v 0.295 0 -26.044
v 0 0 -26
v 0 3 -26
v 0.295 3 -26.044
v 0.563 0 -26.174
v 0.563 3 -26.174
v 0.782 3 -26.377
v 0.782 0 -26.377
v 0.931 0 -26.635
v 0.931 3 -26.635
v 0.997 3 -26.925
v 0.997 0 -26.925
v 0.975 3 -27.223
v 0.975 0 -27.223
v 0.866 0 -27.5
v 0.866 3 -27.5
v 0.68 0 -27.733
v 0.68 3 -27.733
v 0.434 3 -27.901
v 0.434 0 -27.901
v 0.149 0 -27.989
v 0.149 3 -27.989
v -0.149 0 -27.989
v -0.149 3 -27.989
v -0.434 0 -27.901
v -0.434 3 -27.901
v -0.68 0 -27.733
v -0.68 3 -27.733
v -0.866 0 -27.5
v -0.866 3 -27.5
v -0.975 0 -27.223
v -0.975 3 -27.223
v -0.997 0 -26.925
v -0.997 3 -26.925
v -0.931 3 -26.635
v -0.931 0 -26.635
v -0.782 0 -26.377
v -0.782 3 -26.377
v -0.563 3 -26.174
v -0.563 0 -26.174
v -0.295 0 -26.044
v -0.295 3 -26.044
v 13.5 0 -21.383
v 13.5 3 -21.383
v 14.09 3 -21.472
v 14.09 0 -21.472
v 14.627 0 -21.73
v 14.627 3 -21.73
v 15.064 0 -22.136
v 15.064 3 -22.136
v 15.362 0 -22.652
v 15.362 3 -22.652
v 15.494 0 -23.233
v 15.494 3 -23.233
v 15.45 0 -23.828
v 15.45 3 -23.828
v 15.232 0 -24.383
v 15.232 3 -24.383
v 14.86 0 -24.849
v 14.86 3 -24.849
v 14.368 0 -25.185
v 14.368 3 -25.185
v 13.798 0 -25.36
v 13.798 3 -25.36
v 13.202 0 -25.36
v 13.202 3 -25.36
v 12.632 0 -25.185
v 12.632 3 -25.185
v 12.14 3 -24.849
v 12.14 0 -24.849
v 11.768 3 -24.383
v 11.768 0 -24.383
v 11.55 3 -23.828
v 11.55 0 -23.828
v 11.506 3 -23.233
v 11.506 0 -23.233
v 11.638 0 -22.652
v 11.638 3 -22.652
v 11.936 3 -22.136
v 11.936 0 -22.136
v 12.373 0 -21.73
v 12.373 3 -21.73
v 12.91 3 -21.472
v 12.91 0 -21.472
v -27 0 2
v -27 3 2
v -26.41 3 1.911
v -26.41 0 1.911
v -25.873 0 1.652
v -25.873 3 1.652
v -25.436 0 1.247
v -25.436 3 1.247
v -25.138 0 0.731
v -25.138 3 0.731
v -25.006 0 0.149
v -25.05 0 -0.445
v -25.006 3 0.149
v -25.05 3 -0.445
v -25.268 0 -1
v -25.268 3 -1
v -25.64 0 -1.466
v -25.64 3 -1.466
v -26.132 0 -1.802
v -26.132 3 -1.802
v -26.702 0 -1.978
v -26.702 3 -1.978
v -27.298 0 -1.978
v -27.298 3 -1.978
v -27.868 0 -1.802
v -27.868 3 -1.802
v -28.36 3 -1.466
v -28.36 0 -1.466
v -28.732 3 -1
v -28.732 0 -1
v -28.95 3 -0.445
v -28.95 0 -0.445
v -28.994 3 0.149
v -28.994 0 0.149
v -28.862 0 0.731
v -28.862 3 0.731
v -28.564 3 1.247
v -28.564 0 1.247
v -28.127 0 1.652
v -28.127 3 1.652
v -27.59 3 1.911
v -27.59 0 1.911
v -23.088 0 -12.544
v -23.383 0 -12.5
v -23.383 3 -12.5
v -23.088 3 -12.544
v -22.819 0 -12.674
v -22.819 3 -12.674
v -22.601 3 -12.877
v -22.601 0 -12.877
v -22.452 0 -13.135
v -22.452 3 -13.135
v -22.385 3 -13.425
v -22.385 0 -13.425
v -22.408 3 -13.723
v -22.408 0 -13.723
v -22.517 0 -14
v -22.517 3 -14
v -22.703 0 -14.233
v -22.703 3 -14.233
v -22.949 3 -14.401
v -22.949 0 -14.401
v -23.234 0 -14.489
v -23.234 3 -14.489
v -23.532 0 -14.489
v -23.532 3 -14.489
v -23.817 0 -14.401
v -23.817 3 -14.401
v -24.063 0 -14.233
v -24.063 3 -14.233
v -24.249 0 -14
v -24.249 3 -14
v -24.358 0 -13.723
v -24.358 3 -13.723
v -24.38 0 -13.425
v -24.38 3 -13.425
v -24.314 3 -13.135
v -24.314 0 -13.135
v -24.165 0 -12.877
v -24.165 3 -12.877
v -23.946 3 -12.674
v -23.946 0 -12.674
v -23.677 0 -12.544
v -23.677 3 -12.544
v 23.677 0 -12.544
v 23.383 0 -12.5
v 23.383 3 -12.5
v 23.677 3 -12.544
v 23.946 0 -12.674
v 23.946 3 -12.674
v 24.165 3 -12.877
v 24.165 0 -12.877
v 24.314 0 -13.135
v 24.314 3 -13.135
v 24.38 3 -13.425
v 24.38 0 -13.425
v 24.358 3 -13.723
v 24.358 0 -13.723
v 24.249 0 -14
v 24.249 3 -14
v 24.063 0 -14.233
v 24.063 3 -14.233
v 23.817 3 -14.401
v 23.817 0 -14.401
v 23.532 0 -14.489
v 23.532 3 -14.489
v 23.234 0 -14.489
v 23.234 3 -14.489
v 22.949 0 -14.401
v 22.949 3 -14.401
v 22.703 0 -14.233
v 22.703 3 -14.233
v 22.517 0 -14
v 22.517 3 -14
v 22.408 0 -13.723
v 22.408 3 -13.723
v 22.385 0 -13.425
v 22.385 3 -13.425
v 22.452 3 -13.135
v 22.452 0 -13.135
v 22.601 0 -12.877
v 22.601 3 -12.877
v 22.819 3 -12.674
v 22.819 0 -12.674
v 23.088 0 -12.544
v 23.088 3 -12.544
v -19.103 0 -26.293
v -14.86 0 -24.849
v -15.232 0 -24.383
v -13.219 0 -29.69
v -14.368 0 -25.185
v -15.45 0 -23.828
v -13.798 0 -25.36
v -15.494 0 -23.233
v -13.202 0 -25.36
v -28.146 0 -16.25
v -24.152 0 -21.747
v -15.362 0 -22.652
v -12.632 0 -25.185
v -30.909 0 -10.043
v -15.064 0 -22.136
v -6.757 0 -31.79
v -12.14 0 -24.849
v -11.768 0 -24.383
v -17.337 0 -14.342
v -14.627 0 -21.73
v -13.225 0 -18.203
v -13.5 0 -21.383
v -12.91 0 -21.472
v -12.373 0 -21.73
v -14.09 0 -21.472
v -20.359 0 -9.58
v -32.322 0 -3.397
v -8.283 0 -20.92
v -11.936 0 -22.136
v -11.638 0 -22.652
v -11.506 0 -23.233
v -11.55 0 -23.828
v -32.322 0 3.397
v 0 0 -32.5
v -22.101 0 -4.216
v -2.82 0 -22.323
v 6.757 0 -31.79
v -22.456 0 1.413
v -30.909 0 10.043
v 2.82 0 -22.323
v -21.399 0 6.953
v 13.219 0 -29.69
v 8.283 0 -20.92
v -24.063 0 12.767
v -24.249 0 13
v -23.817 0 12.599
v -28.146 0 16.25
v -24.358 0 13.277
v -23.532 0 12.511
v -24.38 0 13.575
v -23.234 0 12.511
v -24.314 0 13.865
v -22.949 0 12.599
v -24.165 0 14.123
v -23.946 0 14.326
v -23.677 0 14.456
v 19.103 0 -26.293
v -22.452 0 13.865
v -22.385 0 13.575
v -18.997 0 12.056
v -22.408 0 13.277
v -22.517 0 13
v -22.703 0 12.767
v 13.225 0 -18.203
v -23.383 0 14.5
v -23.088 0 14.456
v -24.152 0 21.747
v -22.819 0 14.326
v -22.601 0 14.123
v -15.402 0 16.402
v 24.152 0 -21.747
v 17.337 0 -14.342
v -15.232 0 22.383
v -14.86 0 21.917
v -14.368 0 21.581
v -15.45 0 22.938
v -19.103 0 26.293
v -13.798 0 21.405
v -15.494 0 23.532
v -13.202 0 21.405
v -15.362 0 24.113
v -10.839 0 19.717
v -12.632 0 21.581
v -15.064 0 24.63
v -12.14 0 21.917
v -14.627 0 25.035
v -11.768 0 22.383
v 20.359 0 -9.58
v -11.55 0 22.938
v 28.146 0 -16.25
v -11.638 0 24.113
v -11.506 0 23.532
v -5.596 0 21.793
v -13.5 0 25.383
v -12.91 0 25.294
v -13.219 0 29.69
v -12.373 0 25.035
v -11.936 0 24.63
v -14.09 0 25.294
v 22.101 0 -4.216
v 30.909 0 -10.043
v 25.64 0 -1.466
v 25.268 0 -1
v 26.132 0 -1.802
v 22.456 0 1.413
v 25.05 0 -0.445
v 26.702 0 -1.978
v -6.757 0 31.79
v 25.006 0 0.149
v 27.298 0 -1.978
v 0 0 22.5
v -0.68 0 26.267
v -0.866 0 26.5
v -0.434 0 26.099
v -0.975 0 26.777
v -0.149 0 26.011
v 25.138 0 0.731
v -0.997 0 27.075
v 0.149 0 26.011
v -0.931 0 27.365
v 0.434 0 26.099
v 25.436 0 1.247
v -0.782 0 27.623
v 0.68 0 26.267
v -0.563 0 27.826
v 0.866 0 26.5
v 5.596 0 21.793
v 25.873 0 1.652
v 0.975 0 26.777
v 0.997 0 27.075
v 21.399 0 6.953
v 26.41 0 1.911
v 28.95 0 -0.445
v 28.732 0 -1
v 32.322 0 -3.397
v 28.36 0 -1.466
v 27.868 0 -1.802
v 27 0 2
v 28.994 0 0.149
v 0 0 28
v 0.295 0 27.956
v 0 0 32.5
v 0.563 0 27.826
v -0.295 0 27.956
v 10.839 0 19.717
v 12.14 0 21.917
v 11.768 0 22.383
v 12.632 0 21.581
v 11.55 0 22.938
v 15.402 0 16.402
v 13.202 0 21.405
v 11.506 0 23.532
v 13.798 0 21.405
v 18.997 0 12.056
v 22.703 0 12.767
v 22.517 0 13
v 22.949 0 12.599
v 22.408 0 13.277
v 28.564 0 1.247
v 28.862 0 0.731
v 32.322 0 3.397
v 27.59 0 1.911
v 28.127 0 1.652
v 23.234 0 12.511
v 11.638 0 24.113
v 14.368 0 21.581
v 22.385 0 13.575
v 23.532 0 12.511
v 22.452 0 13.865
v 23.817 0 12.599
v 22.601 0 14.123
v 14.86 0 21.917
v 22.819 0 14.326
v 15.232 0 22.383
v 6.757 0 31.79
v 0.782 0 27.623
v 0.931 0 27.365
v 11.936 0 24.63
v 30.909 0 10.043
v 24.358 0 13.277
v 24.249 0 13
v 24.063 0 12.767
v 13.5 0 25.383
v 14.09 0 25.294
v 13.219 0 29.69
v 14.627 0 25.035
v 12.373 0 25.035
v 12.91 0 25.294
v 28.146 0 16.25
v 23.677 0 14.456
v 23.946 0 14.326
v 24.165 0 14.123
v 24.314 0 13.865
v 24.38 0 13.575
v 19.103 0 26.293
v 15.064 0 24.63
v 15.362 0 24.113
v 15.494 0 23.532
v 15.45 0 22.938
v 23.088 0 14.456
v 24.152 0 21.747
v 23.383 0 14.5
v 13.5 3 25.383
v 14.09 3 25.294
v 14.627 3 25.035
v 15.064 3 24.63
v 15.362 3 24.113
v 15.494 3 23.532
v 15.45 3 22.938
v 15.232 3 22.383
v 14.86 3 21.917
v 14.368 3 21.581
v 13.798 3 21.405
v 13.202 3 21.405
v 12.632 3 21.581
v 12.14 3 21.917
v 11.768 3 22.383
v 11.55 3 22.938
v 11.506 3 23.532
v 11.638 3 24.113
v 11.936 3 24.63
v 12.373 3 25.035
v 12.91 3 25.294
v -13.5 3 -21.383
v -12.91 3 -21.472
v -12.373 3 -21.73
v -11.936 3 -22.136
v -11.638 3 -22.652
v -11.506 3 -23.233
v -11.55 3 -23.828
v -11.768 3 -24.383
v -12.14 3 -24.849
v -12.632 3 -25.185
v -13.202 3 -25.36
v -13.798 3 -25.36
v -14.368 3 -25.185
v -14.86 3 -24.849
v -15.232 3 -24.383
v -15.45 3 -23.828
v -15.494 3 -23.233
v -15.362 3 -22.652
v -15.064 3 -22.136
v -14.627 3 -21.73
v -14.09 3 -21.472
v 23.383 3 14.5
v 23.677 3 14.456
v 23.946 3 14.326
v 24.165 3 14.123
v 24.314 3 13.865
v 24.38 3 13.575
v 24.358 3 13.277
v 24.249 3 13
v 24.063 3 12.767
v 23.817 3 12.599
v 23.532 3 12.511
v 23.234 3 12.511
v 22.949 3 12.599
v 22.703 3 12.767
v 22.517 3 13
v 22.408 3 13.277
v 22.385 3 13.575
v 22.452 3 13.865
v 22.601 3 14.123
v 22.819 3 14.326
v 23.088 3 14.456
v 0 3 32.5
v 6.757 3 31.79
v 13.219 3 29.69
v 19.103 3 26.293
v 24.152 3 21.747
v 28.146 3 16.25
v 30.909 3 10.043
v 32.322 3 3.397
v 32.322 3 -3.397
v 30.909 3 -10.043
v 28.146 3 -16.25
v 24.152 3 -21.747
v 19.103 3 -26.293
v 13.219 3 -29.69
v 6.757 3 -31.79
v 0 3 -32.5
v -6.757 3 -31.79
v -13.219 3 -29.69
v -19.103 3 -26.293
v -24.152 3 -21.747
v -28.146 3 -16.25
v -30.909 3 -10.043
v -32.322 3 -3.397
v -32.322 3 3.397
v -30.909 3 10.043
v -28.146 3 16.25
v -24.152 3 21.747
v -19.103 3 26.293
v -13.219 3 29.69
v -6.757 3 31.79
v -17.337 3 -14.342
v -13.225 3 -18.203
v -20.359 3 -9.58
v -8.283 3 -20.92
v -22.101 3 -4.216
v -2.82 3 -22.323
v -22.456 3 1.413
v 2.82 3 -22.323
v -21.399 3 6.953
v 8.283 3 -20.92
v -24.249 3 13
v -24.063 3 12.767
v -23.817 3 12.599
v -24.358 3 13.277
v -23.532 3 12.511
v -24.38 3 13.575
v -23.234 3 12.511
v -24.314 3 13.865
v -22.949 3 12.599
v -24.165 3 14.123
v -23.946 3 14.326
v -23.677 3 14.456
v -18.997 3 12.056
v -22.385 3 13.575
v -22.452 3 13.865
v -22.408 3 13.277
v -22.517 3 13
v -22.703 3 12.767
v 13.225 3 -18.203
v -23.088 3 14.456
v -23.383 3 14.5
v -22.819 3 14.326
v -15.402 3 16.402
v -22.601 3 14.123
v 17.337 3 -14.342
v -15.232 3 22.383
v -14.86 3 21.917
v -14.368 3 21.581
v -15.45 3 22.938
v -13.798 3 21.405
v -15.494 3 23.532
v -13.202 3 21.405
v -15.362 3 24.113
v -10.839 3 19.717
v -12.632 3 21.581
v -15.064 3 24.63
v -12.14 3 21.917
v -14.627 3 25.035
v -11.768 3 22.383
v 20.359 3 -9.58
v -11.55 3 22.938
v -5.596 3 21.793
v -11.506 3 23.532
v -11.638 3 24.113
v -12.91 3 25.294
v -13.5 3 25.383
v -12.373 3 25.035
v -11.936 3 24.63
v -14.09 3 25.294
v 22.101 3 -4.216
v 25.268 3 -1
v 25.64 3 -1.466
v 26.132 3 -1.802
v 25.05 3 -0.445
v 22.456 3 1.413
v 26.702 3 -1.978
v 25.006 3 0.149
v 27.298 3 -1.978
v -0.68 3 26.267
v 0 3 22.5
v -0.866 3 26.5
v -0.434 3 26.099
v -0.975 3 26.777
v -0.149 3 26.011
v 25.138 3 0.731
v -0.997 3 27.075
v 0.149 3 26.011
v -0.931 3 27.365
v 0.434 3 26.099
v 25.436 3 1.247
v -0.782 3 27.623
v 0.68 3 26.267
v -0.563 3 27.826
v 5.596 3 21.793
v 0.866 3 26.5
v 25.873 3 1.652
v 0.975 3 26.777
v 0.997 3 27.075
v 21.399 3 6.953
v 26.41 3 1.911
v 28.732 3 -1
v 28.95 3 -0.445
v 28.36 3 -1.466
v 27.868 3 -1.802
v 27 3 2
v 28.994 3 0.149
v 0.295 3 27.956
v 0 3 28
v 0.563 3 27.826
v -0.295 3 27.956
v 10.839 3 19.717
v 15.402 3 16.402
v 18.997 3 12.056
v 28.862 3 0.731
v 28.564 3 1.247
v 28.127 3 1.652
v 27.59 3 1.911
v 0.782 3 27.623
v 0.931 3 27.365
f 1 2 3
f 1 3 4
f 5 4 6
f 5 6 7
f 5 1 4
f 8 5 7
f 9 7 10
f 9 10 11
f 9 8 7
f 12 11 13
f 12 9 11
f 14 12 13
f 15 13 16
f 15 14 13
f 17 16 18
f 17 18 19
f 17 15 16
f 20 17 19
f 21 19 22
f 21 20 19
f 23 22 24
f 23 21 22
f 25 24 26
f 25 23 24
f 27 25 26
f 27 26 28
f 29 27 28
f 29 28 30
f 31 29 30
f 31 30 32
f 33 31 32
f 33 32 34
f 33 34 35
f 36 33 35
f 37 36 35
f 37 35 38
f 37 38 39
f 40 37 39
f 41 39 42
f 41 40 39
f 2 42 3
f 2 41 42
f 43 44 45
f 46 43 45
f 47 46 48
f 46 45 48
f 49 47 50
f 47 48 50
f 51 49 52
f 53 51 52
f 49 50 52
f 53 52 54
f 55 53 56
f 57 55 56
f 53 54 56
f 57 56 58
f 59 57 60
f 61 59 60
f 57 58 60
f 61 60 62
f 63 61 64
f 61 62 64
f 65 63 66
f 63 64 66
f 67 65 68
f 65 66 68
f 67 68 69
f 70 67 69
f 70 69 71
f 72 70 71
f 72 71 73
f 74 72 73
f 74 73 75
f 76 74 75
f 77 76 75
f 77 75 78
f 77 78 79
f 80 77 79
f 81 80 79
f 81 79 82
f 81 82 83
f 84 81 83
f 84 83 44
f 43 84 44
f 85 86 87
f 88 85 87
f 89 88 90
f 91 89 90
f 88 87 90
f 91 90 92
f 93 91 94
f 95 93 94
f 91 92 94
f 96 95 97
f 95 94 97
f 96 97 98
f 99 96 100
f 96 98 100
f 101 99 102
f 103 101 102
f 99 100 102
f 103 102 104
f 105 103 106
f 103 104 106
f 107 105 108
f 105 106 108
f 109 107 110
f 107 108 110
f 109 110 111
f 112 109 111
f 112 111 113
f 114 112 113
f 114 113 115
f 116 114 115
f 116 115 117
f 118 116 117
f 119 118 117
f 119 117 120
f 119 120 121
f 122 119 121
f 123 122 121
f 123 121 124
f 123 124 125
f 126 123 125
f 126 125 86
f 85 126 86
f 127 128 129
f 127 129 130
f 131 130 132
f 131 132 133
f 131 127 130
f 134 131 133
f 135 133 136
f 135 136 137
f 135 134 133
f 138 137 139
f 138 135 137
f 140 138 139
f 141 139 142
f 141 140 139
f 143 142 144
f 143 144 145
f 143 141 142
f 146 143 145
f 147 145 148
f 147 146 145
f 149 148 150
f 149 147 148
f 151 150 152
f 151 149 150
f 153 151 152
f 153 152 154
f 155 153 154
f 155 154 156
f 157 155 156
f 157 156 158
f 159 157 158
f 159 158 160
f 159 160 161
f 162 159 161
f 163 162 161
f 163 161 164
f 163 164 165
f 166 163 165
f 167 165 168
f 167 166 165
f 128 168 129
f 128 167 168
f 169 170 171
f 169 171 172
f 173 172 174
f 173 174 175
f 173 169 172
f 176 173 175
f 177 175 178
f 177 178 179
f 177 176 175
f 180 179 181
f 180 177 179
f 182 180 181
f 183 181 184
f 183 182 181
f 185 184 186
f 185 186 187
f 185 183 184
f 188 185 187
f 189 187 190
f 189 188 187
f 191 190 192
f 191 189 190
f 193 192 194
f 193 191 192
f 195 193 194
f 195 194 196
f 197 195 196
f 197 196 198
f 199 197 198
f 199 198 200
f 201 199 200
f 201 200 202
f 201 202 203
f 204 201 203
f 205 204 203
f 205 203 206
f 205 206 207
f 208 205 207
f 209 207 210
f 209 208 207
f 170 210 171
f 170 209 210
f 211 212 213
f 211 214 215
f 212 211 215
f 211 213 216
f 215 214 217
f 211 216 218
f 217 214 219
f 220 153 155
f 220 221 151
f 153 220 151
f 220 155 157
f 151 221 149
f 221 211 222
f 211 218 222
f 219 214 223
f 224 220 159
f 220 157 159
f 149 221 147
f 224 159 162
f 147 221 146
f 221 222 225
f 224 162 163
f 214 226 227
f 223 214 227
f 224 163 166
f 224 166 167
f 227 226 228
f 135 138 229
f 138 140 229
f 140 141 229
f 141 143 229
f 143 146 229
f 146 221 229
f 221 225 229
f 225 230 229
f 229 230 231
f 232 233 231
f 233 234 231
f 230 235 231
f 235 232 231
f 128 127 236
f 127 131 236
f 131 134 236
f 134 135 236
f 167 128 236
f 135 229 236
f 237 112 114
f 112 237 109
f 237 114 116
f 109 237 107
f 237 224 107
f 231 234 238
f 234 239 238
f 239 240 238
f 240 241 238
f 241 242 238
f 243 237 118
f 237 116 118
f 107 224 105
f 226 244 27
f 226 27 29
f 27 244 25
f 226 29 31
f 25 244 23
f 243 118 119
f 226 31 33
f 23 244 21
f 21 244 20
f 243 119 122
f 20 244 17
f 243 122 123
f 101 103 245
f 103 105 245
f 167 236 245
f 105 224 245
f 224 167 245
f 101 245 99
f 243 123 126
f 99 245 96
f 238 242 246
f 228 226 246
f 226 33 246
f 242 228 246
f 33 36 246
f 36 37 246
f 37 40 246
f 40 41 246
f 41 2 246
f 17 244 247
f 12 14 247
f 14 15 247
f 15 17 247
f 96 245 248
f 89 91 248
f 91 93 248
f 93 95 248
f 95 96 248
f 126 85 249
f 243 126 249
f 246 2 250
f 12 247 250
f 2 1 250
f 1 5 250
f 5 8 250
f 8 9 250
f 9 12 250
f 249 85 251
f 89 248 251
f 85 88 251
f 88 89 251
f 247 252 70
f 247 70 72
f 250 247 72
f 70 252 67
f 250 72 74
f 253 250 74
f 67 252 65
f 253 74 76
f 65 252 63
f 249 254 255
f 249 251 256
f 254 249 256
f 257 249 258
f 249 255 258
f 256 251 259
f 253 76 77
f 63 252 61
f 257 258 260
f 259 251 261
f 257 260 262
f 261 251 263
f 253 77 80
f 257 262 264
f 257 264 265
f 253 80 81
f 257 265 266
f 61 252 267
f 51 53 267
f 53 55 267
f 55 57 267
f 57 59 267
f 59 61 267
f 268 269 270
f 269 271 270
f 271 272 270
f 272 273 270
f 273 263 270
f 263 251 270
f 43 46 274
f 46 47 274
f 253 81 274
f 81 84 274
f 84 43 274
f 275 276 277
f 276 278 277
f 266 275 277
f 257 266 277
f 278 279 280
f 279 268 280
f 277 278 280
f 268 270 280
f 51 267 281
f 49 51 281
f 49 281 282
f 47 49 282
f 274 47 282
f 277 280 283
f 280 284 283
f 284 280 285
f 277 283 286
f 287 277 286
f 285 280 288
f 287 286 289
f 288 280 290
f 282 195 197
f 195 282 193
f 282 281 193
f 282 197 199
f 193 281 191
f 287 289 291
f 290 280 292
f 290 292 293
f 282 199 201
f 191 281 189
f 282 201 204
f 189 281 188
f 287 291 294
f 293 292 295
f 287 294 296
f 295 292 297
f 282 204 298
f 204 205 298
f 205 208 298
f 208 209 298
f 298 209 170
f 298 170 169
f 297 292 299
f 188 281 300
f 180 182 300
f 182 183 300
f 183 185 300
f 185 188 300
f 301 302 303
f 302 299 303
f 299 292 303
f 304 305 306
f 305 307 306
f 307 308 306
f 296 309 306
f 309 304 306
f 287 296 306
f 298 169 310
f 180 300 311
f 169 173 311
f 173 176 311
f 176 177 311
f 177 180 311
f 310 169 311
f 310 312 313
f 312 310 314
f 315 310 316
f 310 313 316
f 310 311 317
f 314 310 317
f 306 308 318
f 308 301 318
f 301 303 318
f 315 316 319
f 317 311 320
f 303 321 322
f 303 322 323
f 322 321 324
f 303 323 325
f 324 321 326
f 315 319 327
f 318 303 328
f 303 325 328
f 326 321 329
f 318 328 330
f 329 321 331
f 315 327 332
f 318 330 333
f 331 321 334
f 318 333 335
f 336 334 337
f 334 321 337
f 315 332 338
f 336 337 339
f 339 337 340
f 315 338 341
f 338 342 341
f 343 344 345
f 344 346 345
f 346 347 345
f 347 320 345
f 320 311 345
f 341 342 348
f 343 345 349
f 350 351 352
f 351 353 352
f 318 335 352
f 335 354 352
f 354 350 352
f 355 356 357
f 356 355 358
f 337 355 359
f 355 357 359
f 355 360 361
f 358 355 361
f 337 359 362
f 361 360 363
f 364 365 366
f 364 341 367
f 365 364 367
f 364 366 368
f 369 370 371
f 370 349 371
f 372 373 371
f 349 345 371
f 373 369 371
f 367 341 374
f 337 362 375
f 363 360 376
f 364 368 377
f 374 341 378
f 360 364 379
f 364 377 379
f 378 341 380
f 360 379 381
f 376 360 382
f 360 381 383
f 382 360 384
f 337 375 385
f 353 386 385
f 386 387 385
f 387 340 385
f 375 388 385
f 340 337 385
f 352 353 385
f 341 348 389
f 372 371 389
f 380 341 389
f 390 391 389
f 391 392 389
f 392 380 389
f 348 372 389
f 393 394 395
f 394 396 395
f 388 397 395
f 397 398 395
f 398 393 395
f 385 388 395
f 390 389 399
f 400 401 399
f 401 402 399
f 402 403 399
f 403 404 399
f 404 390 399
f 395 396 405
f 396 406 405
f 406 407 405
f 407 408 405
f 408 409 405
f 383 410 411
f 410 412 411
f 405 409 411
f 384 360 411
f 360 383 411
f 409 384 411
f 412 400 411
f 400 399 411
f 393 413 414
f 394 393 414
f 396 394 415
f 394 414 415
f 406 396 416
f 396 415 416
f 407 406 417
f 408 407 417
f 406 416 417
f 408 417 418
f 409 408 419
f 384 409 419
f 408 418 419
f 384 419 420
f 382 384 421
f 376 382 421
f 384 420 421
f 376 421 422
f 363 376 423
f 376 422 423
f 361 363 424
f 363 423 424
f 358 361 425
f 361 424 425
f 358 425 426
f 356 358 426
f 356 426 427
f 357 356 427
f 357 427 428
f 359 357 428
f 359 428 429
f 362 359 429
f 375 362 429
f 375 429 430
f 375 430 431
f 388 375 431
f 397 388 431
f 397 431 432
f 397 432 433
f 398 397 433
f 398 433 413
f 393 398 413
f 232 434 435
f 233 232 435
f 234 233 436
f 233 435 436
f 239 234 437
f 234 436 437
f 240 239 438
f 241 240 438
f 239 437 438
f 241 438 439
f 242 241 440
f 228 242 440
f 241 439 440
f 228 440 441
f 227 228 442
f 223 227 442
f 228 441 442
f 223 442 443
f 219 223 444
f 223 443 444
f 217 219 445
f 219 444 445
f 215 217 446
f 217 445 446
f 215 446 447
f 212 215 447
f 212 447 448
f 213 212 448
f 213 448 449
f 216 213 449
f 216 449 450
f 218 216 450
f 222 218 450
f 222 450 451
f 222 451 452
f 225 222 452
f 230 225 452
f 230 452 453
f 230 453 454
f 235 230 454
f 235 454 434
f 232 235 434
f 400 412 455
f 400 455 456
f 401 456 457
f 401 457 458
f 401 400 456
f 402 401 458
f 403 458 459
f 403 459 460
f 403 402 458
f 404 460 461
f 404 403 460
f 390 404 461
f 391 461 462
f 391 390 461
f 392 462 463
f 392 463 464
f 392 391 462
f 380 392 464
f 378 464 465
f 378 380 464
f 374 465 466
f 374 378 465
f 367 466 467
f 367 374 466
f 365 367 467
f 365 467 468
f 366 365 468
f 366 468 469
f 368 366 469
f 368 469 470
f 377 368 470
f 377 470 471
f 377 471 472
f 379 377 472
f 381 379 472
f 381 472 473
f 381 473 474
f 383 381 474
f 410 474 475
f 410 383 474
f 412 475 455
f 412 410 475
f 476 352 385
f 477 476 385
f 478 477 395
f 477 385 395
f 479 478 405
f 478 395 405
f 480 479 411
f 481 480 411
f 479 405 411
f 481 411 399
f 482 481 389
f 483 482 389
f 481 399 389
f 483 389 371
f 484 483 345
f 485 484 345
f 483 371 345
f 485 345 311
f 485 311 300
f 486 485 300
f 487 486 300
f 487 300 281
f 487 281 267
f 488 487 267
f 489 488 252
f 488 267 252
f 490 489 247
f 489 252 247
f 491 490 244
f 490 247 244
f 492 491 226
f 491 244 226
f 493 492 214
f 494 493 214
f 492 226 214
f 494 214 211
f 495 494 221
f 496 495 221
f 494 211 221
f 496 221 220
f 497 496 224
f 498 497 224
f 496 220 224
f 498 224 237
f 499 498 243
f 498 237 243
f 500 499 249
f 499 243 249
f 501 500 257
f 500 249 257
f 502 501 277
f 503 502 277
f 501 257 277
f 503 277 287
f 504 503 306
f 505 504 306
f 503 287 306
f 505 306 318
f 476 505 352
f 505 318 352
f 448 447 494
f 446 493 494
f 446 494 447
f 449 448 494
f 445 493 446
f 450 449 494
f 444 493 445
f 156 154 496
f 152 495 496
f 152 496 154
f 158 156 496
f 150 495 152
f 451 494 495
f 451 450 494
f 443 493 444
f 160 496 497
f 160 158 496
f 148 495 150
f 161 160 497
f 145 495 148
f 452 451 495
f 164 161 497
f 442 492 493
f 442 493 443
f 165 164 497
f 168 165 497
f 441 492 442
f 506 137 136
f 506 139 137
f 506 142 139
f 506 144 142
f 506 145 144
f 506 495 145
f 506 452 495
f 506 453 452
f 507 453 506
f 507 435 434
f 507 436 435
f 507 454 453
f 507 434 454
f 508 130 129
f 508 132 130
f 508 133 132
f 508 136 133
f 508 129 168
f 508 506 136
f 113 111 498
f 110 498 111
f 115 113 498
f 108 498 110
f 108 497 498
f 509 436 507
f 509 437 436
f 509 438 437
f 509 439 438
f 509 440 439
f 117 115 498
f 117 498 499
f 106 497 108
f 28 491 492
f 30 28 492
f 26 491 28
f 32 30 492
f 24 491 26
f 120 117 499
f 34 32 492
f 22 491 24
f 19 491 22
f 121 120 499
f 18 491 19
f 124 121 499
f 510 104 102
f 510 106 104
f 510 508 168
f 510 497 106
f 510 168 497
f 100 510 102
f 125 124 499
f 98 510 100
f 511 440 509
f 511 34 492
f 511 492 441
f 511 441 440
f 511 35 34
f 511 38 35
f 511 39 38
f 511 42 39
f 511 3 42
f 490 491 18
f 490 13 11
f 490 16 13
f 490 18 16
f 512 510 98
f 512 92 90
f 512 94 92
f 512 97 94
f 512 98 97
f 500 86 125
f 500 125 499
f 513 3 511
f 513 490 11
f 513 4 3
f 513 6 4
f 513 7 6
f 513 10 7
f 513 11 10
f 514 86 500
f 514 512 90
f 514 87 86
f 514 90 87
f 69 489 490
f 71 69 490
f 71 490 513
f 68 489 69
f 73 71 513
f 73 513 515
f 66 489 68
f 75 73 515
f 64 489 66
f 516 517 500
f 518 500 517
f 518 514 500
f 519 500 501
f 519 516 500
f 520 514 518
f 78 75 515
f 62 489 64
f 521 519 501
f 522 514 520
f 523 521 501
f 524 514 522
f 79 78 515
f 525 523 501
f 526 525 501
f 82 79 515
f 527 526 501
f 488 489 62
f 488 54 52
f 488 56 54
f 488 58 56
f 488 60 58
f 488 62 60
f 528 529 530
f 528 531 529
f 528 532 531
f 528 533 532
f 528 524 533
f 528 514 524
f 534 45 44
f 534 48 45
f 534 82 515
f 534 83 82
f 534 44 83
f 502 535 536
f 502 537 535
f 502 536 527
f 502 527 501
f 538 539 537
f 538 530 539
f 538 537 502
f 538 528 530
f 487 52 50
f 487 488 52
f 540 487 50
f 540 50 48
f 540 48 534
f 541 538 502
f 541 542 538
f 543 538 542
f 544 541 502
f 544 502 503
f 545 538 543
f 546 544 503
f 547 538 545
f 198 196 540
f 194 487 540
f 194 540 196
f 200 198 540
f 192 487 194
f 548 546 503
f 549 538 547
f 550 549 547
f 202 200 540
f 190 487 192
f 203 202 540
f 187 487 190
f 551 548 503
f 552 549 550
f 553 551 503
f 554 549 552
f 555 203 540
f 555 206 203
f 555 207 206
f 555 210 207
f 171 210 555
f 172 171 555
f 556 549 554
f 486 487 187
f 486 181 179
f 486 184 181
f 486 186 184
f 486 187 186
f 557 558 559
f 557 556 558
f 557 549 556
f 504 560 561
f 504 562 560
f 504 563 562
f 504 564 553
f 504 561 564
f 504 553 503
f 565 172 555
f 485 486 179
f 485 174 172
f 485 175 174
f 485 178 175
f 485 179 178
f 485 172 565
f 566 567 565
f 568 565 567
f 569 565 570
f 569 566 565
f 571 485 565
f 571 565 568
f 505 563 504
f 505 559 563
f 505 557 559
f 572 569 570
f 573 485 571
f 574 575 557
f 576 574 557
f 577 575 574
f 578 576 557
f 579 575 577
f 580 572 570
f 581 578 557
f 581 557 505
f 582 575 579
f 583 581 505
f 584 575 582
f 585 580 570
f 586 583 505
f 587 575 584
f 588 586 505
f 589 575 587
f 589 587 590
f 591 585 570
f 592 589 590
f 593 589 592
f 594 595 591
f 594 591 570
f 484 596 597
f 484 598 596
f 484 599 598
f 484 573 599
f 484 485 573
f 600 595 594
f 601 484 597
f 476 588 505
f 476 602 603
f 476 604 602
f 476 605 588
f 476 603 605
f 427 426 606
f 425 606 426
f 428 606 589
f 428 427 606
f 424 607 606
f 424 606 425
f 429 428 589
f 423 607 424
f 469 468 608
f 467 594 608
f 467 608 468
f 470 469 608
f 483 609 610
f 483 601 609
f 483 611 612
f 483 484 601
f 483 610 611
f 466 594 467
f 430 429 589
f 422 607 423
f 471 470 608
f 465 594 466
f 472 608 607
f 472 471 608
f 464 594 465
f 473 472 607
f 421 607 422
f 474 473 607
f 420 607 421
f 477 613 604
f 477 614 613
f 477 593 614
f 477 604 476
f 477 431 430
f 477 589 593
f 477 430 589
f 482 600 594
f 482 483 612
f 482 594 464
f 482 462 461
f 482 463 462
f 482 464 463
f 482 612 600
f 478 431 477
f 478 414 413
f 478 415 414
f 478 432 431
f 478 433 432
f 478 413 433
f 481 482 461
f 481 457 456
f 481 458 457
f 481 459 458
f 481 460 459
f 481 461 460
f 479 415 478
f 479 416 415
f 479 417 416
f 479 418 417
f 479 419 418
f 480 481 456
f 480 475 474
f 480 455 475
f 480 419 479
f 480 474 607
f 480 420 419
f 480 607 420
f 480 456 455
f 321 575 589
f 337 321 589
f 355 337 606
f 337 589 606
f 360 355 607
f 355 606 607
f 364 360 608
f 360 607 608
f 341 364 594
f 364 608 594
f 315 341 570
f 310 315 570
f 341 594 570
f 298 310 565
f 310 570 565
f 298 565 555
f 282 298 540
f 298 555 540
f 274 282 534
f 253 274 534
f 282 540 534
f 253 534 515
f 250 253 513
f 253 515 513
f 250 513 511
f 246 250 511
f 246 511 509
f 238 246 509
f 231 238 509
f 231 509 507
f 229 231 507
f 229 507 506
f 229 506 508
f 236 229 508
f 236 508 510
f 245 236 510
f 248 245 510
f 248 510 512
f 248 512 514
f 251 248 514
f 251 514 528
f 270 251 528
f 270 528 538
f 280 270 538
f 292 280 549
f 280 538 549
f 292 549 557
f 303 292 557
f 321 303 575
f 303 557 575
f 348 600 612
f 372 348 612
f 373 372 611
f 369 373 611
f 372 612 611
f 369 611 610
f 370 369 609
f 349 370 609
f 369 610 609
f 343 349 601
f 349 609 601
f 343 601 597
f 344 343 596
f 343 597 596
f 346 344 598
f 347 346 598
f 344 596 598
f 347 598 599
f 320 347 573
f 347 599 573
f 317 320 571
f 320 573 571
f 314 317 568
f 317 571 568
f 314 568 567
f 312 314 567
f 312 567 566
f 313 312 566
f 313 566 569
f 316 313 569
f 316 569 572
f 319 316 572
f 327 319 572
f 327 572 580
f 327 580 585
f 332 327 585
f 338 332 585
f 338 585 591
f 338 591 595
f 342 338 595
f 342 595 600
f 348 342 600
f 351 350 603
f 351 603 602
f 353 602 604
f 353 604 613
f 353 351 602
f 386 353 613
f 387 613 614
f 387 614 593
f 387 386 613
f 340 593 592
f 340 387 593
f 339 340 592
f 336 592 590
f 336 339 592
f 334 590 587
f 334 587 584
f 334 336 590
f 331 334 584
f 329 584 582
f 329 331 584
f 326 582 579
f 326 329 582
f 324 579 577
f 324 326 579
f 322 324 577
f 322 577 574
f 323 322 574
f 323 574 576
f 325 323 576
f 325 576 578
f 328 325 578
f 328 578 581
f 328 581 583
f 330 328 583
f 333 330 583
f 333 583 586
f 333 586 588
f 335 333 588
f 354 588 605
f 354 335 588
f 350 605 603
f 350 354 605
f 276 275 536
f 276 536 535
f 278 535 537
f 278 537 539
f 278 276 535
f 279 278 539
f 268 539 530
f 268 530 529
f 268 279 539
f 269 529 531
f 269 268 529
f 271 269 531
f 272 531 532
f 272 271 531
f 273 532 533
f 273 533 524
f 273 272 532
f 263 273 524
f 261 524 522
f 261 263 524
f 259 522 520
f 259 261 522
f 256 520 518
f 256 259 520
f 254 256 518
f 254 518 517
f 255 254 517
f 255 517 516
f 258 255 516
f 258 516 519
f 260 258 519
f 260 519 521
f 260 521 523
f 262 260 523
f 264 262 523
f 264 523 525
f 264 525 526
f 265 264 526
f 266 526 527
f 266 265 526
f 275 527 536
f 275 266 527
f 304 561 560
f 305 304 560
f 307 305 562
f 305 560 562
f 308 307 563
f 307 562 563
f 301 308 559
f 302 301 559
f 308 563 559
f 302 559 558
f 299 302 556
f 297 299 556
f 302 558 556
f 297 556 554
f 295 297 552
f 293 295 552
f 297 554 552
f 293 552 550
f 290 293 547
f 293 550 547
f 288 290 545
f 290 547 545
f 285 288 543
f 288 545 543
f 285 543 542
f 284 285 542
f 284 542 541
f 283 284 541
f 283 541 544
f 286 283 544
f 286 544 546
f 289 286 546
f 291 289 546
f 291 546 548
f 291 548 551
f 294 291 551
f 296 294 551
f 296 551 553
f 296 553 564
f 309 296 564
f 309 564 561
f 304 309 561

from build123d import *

# Parameters (mm, degrees)
SKETCH1_R           = 32.5
SKETCH1_R_2         = 1
BOSS_EXTRUDE1_DEPTH = 3
SKETCH2_R           = 22.5
SKETCH2_R_2         = 2
CUT_EXTRUDE1_DEPTH  = 47.059743812


with BuildPart() as part:
    # Sketch1 → Boss-Extrude1 (new body)
    with BuildSketch(Plane(origin=(0, 0, 0), x_dir=(1, 0, 0), z_dir=(0, 1, 0))):
        with Locations(Location((0, 0, 0), (0, 0, 270))):
            Circle(SKETCH1_R)
        with Locations(Location((0, 27, 0), (0, 0, 270))):
            Circle(SKETCH1_R_2, mode=Mode.SUBTRACT)
        with Locations(Location((23.382685902, 13.5, 0), (0, 0, 270))):
            Circle(SKETCH1_R_2, mode=Mode.SUBTRACT)
        with Locations(Location((23.382685902, -13.5, 0), (0, 0, 270))):
            Circle(SKETCH1_R_2, mode=Mode.SUBTRACT)
        with Locations(Location((0, -27, 0), (0, 0, 270))):
            Circle(SKETCH1_R_2, mode=Mode.SUBTRACT)
        with Locations(Location((-23.382685902, -13.5, 0), (0, 0, 270))):
            Circle(SKETCH1_R_2, mode=Mode.SUBTRACT)
        with Locations(Location((-23.382685902, 13.5, 0), (0, 0, 270))):
            Circle(SKETCH1_R_2, mode=Mode.SUBTRACT)
    extrude(amount=BOSS_EXTRUDE1_DEPTH)

    # Sketch2 → Cut-Extrude1 (cut, through all)
    with BuildSketch(Plane(origin=(0, 3, 0), x_dir=(1, 0, 0), z_dir=(0, 1, 0))):
        with Locations(Location((0, 0, 0), (0, 0, 270))):
            Circle(SKETCH2_R)
        with Locations(Location((-13.5, 23.382685902, 0), (0, 0, 270))):
            Circle(SKETCH2_R_2)
        with Locations(Location((13.5, 23.382685902, 0), (0, 0, 270))):
            Circle(SKETCH2_R_2)
        with Locations(Location((27, 0, 0), (0, 0, 270))):
            Circle(SKETCH2_R_2)
        with Locations(Location((13.5, -23.382685902, 0), (0, 0, 270))):
            Circle(SKETCH2_R_2)
        with Locations(Location((-13.5, -23.382685902, 0), (0, 0, 270))):
            Circle(SKETCH2_R_2)
        with Locations(Location((-27, 0, 0), (0, 0, 270))):
            Circle(SKETCH2_R_2)
    extrude(amount=-CUT_EXTRUDE1_DEPTH, mode=Mode.SUBTRACT)


solid = part.part
